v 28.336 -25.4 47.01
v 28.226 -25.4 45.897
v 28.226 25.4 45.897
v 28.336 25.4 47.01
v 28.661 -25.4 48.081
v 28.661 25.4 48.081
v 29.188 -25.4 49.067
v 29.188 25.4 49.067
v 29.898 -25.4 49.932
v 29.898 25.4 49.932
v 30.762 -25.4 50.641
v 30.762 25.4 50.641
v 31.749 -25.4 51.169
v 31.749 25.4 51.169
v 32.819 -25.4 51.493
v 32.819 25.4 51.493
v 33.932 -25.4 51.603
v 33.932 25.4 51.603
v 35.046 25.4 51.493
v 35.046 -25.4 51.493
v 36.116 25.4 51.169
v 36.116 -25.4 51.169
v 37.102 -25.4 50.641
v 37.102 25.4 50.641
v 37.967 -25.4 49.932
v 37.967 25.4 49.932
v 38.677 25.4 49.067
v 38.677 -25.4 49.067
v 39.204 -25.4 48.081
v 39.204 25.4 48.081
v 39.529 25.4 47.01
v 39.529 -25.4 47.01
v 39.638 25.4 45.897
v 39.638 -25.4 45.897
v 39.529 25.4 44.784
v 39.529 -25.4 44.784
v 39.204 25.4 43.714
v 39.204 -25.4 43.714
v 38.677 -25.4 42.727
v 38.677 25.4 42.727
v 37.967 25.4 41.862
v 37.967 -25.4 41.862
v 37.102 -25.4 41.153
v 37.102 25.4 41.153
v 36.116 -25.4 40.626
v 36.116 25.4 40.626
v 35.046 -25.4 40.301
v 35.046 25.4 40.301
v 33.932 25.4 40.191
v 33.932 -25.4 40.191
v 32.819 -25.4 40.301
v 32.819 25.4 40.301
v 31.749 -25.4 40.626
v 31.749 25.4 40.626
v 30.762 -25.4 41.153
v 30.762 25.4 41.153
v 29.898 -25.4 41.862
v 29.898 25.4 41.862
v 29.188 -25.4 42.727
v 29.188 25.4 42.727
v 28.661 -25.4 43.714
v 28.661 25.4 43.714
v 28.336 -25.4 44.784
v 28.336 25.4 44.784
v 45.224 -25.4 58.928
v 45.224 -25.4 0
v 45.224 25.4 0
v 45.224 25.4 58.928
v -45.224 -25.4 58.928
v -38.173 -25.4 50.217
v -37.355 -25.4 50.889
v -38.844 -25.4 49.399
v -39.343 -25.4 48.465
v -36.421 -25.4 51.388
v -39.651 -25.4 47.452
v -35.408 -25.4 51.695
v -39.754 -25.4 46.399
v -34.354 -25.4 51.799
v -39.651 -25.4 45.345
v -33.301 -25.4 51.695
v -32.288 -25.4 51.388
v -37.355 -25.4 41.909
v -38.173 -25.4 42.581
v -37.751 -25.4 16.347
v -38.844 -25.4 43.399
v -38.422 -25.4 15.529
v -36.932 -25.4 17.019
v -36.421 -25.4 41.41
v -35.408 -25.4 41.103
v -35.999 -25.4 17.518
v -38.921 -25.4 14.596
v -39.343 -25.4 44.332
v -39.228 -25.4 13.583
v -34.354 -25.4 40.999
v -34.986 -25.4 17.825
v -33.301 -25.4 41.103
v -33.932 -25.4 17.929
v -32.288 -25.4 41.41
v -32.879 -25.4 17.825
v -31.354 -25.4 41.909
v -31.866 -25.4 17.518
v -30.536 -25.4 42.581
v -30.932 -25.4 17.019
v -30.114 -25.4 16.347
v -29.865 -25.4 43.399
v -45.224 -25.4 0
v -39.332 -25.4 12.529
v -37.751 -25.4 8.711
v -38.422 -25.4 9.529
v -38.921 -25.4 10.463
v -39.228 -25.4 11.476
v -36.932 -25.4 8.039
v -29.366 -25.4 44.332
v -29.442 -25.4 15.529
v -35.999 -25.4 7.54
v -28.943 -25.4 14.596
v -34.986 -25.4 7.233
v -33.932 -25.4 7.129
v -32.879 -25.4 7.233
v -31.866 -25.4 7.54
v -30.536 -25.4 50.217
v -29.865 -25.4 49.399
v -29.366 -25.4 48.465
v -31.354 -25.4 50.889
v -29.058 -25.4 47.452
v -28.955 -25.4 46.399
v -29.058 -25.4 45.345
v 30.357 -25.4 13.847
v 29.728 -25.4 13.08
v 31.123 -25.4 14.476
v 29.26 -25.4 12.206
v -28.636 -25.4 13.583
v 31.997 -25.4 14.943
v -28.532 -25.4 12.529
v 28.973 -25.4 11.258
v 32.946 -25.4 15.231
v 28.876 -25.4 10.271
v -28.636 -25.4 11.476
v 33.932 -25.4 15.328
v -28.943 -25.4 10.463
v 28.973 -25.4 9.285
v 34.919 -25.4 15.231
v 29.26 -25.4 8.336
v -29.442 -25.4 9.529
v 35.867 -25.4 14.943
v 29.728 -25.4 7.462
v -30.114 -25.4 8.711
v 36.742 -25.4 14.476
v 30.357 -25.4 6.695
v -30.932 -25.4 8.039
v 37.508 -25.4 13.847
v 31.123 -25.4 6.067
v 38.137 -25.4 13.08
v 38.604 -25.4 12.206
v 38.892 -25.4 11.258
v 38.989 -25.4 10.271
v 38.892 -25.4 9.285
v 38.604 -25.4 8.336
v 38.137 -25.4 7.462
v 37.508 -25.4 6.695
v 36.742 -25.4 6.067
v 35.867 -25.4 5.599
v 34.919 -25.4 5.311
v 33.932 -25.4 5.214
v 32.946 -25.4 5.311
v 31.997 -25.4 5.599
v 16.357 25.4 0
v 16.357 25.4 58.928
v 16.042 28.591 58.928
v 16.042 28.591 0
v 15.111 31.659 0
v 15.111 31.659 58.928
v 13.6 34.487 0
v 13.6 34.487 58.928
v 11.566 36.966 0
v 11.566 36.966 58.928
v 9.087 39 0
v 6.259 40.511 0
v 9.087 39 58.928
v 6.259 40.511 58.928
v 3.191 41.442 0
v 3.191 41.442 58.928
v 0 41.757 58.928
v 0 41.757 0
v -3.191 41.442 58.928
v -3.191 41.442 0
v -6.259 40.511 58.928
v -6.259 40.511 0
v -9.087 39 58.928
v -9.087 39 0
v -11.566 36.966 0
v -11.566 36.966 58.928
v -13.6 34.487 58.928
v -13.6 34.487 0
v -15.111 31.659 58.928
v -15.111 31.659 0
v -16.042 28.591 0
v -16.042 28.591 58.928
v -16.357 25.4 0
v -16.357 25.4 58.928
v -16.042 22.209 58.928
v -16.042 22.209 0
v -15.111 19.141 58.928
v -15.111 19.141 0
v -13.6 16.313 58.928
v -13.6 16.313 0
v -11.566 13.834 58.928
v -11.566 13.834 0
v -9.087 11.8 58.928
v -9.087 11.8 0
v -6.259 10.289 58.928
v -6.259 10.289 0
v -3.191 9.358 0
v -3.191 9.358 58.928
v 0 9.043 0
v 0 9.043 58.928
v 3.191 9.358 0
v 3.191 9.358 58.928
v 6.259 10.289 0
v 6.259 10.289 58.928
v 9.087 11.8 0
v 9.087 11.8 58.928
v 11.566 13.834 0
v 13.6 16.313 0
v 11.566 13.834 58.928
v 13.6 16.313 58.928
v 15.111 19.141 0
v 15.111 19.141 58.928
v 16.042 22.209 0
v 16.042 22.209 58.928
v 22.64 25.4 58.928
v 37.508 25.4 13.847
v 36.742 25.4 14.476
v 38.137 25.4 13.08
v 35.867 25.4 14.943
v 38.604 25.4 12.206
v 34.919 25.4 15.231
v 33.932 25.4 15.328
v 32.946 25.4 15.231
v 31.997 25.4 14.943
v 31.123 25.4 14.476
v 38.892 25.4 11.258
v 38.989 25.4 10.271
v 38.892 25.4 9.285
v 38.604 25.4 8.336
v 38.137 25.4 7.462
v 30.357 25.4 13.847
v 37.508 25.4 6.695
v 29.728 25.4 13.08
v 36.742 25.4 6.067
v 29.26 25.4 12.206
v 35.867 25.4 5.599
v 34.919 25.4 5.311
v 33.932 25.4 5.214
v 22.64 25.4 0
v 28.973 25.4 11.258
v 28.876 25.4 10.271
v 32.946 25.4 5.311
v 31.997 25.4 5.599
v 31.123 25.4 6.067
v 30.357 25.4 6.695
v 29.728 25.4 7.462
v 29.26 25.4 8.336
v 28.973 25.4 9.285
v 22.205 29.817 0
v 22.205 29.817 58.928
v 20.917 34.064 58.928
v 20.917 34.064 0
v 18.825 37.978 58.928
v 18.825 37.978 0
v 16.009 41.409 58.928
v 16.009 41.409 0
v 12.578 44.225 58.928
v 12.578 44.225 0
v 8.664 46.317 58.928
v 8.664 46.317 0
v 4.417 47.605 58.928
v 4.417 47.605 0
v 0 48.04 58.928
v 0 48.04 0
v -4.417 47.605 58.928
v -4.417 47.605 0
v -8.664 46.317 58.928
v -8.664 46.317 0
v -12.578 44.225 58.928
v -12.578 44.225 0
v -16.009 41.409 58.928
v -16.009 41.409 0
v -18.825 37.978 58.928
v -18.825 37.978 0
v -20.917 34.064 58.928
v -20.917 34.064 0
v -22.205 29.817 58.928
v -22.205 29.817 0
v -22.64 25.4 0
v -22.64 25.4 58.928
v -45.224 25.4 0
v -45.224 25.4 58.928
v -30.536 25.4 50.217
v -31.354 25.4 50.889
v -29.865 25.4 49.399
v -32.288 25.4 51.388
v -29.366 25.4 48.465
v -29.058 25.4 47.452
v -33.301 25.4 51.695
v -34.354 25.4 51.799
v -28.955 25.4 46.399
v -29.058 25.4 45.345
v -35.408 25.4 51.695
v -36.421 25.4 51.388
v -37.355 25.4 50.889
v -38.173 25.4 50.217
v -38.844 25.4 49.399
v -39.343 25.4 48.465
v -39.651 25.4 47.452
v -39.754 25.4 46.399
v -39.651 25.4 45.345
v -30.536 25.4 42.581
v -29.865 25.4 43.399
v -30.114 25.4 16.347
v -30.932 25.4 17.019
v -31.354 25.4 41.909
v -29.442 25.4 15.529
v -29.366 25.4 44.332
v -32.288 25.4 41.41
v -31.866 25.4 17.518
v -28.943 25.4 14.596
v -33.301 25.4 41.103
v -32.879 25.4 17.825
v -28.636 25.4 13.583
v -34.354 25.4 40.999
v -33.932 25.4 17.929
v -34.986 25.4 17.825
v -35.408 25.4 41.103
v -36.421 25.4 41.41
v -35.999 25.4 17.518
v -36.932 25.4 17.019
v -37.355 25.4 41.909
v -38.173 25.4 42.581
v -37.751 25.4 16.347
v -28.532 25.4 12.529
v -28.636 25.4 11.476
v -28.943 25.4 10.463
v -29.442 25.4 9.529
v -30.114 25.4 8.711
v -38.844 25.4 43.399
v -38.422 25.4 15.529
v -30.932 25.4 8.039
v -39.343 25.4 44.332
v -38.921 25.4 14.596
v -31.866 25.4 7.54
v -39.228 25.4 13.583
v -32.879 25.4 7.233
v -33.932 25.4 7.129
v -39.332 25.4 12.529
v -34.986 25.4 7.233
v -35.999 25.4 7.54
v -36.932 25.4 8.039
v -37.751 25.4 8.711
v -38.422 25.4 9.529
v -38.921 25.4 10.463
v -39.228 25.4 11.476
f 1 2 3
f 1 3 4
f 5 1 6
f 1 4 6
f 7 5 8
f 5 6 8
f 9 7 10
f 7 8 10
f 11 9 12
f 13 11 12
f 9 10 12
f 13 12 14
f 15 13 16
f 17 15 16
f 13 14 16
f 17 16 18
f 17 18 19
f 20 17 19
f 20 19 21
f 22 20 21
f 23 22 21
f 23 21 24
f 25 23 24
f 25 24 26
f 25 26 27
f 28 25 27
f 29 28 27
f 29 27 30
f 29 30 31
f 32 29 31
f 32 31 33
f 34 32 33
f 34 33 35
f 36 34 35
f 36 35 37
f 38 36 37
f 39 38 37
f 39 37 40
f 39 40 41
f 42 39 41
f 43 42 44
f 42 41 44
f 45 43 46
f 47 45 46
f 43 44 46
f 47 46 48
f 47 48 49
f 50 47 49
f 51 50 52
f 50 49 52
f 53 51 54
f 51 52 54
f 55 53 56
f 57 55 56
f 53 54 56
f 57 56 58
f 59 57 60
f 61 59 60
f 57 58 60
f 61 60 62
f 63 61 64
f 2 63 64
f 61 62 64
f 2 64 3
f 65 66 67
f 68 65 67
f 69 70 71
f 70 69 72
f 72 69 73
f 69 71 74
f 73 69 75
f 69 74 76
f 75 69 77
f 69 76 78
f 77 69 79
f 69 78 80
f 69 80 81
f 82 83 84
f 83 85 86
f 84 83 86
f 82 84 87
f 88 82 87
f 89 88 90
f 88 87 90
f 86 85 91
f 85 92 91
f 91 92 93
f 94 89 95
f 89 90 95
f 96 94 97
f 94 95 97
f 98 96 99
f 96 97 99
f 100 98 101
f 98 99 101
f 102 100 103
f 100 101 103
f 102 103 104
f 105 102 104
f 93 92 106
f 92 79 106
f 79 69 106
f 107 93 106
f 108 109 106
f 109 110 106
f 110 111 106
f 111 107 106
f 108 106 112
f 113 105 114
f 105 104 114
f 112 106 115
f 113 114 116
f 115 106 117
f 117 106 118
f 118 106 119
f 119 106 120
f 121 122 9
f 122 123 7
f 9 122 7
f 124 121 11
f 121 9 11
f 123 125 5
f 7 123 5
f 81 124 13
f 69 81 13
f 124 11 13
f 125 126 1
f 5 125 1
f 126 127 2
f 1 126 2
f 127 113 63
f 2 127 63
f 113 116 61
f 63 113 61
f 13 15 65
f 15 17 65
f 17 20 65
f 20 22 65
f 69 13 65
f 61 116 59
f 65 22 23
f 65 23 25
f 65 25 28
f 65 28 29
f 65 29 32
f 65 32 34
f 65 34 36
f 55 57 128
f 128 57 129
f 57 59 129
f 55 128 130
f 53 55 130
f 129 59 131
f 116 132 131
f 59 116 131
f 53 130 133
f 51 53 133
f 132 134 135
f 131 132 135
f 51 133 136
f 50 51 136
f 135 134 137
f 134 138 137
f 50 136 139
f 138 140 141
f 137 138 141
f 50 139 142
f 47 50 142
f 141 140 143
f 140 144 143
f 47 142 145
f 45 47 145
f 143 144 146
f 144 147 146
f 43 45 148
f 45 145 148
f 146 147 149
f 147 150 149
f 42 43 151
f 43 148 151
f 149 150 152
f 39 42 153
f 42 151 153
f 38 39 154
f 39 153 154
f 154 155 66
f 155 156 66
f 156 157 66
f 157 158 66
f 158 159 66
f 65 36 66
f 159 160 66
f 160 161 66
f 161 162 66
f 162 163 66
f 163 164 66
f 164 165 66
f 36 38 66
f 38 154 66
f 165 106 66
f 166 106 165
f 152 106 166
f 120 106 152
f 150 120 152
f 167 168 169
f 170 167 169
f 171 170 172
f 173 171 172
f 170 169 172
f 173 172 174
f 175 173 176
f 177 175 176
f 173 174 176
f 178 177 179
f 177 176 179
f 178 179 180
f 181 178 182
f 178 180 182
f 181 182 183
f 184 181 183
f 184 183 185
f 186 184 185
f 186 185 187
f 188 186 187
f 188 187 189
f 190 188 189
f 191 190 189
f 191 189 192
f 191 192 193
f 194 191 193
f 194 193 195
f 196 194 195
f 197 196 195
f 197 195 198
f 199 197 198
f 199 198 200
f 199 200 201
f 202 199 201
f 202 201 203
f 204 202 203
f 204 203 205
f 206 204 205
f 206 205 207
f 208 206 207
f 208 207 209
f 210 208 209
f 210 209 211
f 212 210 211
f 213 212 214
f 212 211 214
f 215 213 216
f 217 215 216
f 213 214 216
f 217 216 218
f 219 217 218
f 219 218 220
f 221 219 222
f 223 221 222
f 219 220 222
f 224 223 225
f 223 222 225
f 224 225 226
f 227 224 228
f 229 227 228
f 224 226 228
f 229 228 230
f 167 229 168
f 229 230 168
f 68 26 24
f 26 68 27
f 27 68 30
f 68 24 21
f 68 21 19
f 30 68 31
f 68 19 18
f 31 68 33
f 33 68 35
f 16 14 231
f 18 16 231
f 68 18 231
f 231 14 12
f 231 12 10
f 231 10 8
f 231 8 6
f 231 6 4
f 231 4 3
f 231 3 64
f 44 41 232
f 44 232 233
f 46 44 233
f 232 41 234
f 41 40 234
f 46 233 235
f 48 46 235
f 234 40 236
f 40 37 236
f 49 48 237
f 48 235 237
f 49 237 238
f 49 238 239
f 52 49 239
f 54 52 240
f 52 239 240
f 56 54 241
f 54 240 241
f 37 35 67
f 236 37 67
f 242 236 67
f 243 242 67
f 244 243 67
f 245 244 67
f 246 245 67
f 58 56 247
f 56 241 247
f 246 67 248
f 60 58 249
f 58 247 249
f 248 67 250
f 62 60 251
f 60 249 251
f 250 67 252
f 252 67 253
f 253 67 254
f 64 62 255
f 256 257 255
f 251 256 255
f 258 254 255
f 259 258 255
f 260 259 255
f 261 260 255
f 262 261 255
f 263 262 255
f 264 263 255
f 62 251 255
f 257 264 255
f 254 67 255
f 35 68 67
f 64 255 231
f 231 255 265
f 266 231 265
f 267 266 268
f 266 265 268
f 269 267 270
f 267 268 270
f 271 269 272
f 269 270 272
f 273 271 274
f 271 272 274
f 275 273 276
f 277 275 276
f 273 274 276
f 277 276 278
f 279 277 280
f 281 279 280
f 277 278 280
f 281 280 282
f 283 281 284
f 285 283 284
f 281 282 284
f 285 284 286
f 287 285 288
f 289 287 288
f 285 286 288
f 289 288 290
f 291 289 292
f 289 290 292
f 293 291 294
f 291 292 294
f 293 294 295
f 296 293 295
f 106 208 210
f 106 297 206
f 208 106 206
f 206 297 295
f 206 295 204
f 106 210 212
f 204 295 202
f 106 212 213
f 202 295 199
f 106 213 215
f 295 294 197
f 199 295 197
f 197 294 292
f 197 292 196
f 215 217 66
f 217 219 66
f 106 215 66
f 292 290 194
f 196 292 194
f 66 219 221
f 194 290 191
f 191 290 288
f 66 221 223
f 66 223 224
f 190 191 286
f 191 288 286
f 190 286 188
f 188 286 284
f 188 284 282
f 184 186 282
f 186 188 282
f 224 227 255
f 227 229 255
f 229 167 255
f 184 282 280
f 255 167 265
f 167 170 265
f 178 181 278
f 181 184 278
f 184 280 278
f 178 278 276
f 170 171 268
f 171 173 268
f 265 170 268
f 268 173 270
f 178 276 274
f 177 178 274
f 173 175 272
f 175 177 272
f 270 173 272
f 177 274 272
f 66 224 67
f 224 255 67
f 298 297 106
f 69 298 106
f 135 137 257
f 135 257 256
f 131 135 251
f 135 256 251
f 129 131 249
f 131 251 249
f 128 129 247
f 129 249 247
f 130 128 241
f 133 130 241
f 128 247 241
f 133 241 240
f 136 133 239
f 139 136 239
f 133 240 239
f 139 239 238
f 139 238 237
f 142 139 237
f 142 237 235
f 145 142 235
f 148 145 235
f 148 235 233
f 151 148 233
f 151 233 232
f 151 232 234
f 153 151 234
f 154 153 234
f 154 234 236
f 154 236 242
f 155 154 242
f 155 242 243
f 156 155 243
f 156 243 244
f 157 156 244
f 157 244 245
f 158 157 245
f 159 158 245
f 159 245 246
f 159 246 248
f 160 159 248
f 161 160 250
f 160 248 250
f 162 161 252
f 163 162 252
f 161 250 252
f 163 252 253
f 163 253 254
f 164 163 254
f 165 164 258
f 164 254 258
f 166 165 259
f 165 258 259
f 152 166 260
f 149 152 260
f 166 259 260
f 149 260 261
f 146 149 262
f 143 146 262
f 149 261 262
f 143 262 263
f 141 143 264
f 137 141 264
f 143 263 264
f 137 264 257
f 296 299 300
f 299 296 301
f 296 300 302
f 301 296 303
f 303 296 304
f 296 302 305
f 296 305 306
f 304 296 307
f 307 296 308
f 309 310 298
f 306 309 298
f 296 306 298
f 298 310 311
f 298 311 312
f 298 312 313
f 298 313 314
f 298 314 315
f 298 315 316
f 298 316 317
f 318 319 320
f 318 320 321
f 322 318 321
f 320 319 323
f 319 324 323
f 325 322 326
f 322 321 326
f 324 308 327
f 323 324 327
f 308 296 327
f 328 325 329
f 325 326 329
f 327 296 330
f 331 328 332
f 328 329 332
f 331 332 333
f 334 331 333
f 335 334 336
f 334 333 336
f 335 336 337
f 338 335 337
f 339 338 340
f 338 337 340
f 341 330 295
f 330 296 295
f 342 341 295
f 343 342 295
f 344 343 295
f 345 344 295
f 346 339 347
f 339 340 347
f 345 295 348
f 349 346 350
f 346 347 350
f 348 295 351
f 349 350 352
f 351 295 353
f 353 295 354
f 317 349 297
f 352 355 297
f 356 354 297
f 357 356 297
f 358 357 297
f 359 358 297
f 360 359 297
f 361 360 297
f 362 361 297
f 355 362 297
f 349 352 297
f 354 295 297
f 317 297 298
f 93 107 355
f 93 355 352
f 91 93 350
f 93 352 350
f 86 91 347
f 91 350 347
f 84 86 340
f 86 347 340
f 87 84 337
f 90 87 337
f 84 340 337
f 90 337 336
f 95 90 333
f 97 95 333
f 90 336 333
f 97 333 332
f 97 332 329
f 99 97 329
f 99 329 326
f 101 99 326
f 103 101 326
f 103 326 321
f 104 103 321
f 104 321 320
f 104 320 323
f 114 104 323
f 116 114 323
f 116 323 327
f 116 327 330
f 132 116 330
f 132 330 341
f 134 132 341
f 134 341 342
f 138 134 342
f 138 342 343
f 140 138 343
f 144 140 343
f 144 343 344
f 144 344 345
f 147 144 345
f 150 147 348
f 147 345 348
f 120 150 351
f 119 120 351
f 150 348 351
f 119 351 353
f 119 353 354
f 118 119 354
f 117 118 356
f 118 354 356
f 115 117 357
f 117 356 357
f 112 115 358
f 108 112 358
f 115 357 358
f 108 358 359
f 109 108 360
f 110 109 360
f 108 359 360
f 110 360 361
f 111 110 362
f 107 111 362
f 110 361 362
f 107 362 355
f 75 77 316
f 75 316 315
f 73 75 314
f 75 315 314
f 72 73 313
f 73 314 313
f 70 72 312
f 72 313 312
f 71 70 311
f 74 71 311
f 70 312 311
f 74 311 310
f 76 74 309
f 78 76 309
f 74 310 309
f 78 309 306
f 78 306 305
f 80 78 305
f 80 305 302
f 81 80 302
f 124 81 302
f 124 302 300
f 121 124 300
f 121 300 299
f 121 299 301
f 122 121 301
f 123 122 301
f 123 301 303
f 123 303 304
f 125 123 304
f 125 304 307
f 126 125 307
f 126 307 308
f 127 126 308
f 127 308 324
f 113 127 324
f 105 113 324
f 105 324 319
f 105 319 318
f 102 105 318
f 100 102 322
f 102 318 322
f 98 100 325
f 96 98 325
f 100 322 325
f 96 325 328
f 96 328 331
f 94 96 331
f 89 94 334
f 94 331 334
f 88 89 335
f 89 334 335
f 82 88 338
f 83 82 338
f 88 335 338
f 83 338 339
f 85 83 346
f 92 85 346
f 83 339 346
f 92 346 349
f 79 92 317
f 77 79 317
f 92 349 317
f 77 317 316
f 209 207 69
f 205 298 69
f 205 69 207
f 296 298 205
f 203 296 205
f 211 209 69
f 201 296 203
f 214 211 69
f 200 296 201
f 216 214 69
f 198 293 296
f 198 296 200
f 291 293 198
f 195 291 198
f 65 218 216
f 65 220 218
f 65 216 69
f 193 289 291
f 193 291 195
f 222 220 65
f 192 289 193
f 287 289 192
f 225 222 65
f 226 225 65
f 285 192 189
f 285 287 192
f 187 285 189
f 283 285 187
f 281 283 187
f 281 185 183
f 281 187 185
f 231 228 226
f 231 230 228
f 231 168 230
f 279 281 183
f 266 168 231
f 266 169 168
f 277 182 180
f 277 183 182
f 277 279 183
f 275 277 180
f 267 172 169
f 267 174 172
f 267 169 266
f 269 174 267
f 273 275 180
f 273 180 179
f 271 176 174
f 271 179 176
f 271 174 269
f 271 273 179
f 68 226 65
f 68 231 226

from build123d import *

# Parameters (mm, degrees)
F1_DEPTH = 58.928
F2_R     = 16.356515
F3_DEPTH = 79.502
F4_R     = 5.399917
F5_DEPTH = 98.044
F6_R     = 5.056805
F6_R_2   = 5.705972
F7_DEPTH = 93.726


with BuildPart() as f1:
    # F0 (on Top) → F1 (new body)
    with BuildSketch(Plane.XY):
        with BuildLine():
            Line((45.224381, -25.4), (45.224381, 25.4))
            Line((45.224381, 25.4), (22.640265, 25.4))
            ThreePointArc((22.640265, 25.4), (0, 48.040265), (-22.640265, 25.4))
            Line((-22.640265, 25.4), (-45.224381, 25.4))
            Line((-45.224381, 25.4), (-45.224381, -25.4))
            Line((-45.224381, -25.4), (45.224381, -25.4))
        make_face()
    extrude(amount=F1_DEPTH)

    # F2 (on face) → F3 (cut)
    with BuildSketch(Plane.XY.offset(58.928)):
        with Locations((0, 25.4)):
            Circle(F2_R)
    extrude(amount=-F3_DEPTH, mode=Mode.SUBTRACT)

    # F4 (on face) → F5 (cut)
    with BuildSketch(Plane(origin=(0, 25.4, 0), x_dir=(-1, 0, 0), z_dir=(0, 1, 0))):
        with Locations((33.932323, 12.529076)):
            Circle(F4_R)
        with Locations((34.354472, 46.398924)):
            Circle(F4_R)
    extrude(amount=-F5_DEPTH, mode=Mode.SUBTRACT)

    # F6 (on face) → F7 (cut)
    with BuildSketch(Plane(origin=(0, 25.4, 0), x_dir=(-1, 0, 0), z_dir=(0, 1, 0))):
        with Locations((-33.932323, 10.271089)):
            Circle(F6_R)
        with Locations((-33.932323, 45.897149)):
            Circle(F6_R_2)
    extrude(amount=-F7_DEPTH, mode=Mode.SUBTRACT)


solid = f1.part
